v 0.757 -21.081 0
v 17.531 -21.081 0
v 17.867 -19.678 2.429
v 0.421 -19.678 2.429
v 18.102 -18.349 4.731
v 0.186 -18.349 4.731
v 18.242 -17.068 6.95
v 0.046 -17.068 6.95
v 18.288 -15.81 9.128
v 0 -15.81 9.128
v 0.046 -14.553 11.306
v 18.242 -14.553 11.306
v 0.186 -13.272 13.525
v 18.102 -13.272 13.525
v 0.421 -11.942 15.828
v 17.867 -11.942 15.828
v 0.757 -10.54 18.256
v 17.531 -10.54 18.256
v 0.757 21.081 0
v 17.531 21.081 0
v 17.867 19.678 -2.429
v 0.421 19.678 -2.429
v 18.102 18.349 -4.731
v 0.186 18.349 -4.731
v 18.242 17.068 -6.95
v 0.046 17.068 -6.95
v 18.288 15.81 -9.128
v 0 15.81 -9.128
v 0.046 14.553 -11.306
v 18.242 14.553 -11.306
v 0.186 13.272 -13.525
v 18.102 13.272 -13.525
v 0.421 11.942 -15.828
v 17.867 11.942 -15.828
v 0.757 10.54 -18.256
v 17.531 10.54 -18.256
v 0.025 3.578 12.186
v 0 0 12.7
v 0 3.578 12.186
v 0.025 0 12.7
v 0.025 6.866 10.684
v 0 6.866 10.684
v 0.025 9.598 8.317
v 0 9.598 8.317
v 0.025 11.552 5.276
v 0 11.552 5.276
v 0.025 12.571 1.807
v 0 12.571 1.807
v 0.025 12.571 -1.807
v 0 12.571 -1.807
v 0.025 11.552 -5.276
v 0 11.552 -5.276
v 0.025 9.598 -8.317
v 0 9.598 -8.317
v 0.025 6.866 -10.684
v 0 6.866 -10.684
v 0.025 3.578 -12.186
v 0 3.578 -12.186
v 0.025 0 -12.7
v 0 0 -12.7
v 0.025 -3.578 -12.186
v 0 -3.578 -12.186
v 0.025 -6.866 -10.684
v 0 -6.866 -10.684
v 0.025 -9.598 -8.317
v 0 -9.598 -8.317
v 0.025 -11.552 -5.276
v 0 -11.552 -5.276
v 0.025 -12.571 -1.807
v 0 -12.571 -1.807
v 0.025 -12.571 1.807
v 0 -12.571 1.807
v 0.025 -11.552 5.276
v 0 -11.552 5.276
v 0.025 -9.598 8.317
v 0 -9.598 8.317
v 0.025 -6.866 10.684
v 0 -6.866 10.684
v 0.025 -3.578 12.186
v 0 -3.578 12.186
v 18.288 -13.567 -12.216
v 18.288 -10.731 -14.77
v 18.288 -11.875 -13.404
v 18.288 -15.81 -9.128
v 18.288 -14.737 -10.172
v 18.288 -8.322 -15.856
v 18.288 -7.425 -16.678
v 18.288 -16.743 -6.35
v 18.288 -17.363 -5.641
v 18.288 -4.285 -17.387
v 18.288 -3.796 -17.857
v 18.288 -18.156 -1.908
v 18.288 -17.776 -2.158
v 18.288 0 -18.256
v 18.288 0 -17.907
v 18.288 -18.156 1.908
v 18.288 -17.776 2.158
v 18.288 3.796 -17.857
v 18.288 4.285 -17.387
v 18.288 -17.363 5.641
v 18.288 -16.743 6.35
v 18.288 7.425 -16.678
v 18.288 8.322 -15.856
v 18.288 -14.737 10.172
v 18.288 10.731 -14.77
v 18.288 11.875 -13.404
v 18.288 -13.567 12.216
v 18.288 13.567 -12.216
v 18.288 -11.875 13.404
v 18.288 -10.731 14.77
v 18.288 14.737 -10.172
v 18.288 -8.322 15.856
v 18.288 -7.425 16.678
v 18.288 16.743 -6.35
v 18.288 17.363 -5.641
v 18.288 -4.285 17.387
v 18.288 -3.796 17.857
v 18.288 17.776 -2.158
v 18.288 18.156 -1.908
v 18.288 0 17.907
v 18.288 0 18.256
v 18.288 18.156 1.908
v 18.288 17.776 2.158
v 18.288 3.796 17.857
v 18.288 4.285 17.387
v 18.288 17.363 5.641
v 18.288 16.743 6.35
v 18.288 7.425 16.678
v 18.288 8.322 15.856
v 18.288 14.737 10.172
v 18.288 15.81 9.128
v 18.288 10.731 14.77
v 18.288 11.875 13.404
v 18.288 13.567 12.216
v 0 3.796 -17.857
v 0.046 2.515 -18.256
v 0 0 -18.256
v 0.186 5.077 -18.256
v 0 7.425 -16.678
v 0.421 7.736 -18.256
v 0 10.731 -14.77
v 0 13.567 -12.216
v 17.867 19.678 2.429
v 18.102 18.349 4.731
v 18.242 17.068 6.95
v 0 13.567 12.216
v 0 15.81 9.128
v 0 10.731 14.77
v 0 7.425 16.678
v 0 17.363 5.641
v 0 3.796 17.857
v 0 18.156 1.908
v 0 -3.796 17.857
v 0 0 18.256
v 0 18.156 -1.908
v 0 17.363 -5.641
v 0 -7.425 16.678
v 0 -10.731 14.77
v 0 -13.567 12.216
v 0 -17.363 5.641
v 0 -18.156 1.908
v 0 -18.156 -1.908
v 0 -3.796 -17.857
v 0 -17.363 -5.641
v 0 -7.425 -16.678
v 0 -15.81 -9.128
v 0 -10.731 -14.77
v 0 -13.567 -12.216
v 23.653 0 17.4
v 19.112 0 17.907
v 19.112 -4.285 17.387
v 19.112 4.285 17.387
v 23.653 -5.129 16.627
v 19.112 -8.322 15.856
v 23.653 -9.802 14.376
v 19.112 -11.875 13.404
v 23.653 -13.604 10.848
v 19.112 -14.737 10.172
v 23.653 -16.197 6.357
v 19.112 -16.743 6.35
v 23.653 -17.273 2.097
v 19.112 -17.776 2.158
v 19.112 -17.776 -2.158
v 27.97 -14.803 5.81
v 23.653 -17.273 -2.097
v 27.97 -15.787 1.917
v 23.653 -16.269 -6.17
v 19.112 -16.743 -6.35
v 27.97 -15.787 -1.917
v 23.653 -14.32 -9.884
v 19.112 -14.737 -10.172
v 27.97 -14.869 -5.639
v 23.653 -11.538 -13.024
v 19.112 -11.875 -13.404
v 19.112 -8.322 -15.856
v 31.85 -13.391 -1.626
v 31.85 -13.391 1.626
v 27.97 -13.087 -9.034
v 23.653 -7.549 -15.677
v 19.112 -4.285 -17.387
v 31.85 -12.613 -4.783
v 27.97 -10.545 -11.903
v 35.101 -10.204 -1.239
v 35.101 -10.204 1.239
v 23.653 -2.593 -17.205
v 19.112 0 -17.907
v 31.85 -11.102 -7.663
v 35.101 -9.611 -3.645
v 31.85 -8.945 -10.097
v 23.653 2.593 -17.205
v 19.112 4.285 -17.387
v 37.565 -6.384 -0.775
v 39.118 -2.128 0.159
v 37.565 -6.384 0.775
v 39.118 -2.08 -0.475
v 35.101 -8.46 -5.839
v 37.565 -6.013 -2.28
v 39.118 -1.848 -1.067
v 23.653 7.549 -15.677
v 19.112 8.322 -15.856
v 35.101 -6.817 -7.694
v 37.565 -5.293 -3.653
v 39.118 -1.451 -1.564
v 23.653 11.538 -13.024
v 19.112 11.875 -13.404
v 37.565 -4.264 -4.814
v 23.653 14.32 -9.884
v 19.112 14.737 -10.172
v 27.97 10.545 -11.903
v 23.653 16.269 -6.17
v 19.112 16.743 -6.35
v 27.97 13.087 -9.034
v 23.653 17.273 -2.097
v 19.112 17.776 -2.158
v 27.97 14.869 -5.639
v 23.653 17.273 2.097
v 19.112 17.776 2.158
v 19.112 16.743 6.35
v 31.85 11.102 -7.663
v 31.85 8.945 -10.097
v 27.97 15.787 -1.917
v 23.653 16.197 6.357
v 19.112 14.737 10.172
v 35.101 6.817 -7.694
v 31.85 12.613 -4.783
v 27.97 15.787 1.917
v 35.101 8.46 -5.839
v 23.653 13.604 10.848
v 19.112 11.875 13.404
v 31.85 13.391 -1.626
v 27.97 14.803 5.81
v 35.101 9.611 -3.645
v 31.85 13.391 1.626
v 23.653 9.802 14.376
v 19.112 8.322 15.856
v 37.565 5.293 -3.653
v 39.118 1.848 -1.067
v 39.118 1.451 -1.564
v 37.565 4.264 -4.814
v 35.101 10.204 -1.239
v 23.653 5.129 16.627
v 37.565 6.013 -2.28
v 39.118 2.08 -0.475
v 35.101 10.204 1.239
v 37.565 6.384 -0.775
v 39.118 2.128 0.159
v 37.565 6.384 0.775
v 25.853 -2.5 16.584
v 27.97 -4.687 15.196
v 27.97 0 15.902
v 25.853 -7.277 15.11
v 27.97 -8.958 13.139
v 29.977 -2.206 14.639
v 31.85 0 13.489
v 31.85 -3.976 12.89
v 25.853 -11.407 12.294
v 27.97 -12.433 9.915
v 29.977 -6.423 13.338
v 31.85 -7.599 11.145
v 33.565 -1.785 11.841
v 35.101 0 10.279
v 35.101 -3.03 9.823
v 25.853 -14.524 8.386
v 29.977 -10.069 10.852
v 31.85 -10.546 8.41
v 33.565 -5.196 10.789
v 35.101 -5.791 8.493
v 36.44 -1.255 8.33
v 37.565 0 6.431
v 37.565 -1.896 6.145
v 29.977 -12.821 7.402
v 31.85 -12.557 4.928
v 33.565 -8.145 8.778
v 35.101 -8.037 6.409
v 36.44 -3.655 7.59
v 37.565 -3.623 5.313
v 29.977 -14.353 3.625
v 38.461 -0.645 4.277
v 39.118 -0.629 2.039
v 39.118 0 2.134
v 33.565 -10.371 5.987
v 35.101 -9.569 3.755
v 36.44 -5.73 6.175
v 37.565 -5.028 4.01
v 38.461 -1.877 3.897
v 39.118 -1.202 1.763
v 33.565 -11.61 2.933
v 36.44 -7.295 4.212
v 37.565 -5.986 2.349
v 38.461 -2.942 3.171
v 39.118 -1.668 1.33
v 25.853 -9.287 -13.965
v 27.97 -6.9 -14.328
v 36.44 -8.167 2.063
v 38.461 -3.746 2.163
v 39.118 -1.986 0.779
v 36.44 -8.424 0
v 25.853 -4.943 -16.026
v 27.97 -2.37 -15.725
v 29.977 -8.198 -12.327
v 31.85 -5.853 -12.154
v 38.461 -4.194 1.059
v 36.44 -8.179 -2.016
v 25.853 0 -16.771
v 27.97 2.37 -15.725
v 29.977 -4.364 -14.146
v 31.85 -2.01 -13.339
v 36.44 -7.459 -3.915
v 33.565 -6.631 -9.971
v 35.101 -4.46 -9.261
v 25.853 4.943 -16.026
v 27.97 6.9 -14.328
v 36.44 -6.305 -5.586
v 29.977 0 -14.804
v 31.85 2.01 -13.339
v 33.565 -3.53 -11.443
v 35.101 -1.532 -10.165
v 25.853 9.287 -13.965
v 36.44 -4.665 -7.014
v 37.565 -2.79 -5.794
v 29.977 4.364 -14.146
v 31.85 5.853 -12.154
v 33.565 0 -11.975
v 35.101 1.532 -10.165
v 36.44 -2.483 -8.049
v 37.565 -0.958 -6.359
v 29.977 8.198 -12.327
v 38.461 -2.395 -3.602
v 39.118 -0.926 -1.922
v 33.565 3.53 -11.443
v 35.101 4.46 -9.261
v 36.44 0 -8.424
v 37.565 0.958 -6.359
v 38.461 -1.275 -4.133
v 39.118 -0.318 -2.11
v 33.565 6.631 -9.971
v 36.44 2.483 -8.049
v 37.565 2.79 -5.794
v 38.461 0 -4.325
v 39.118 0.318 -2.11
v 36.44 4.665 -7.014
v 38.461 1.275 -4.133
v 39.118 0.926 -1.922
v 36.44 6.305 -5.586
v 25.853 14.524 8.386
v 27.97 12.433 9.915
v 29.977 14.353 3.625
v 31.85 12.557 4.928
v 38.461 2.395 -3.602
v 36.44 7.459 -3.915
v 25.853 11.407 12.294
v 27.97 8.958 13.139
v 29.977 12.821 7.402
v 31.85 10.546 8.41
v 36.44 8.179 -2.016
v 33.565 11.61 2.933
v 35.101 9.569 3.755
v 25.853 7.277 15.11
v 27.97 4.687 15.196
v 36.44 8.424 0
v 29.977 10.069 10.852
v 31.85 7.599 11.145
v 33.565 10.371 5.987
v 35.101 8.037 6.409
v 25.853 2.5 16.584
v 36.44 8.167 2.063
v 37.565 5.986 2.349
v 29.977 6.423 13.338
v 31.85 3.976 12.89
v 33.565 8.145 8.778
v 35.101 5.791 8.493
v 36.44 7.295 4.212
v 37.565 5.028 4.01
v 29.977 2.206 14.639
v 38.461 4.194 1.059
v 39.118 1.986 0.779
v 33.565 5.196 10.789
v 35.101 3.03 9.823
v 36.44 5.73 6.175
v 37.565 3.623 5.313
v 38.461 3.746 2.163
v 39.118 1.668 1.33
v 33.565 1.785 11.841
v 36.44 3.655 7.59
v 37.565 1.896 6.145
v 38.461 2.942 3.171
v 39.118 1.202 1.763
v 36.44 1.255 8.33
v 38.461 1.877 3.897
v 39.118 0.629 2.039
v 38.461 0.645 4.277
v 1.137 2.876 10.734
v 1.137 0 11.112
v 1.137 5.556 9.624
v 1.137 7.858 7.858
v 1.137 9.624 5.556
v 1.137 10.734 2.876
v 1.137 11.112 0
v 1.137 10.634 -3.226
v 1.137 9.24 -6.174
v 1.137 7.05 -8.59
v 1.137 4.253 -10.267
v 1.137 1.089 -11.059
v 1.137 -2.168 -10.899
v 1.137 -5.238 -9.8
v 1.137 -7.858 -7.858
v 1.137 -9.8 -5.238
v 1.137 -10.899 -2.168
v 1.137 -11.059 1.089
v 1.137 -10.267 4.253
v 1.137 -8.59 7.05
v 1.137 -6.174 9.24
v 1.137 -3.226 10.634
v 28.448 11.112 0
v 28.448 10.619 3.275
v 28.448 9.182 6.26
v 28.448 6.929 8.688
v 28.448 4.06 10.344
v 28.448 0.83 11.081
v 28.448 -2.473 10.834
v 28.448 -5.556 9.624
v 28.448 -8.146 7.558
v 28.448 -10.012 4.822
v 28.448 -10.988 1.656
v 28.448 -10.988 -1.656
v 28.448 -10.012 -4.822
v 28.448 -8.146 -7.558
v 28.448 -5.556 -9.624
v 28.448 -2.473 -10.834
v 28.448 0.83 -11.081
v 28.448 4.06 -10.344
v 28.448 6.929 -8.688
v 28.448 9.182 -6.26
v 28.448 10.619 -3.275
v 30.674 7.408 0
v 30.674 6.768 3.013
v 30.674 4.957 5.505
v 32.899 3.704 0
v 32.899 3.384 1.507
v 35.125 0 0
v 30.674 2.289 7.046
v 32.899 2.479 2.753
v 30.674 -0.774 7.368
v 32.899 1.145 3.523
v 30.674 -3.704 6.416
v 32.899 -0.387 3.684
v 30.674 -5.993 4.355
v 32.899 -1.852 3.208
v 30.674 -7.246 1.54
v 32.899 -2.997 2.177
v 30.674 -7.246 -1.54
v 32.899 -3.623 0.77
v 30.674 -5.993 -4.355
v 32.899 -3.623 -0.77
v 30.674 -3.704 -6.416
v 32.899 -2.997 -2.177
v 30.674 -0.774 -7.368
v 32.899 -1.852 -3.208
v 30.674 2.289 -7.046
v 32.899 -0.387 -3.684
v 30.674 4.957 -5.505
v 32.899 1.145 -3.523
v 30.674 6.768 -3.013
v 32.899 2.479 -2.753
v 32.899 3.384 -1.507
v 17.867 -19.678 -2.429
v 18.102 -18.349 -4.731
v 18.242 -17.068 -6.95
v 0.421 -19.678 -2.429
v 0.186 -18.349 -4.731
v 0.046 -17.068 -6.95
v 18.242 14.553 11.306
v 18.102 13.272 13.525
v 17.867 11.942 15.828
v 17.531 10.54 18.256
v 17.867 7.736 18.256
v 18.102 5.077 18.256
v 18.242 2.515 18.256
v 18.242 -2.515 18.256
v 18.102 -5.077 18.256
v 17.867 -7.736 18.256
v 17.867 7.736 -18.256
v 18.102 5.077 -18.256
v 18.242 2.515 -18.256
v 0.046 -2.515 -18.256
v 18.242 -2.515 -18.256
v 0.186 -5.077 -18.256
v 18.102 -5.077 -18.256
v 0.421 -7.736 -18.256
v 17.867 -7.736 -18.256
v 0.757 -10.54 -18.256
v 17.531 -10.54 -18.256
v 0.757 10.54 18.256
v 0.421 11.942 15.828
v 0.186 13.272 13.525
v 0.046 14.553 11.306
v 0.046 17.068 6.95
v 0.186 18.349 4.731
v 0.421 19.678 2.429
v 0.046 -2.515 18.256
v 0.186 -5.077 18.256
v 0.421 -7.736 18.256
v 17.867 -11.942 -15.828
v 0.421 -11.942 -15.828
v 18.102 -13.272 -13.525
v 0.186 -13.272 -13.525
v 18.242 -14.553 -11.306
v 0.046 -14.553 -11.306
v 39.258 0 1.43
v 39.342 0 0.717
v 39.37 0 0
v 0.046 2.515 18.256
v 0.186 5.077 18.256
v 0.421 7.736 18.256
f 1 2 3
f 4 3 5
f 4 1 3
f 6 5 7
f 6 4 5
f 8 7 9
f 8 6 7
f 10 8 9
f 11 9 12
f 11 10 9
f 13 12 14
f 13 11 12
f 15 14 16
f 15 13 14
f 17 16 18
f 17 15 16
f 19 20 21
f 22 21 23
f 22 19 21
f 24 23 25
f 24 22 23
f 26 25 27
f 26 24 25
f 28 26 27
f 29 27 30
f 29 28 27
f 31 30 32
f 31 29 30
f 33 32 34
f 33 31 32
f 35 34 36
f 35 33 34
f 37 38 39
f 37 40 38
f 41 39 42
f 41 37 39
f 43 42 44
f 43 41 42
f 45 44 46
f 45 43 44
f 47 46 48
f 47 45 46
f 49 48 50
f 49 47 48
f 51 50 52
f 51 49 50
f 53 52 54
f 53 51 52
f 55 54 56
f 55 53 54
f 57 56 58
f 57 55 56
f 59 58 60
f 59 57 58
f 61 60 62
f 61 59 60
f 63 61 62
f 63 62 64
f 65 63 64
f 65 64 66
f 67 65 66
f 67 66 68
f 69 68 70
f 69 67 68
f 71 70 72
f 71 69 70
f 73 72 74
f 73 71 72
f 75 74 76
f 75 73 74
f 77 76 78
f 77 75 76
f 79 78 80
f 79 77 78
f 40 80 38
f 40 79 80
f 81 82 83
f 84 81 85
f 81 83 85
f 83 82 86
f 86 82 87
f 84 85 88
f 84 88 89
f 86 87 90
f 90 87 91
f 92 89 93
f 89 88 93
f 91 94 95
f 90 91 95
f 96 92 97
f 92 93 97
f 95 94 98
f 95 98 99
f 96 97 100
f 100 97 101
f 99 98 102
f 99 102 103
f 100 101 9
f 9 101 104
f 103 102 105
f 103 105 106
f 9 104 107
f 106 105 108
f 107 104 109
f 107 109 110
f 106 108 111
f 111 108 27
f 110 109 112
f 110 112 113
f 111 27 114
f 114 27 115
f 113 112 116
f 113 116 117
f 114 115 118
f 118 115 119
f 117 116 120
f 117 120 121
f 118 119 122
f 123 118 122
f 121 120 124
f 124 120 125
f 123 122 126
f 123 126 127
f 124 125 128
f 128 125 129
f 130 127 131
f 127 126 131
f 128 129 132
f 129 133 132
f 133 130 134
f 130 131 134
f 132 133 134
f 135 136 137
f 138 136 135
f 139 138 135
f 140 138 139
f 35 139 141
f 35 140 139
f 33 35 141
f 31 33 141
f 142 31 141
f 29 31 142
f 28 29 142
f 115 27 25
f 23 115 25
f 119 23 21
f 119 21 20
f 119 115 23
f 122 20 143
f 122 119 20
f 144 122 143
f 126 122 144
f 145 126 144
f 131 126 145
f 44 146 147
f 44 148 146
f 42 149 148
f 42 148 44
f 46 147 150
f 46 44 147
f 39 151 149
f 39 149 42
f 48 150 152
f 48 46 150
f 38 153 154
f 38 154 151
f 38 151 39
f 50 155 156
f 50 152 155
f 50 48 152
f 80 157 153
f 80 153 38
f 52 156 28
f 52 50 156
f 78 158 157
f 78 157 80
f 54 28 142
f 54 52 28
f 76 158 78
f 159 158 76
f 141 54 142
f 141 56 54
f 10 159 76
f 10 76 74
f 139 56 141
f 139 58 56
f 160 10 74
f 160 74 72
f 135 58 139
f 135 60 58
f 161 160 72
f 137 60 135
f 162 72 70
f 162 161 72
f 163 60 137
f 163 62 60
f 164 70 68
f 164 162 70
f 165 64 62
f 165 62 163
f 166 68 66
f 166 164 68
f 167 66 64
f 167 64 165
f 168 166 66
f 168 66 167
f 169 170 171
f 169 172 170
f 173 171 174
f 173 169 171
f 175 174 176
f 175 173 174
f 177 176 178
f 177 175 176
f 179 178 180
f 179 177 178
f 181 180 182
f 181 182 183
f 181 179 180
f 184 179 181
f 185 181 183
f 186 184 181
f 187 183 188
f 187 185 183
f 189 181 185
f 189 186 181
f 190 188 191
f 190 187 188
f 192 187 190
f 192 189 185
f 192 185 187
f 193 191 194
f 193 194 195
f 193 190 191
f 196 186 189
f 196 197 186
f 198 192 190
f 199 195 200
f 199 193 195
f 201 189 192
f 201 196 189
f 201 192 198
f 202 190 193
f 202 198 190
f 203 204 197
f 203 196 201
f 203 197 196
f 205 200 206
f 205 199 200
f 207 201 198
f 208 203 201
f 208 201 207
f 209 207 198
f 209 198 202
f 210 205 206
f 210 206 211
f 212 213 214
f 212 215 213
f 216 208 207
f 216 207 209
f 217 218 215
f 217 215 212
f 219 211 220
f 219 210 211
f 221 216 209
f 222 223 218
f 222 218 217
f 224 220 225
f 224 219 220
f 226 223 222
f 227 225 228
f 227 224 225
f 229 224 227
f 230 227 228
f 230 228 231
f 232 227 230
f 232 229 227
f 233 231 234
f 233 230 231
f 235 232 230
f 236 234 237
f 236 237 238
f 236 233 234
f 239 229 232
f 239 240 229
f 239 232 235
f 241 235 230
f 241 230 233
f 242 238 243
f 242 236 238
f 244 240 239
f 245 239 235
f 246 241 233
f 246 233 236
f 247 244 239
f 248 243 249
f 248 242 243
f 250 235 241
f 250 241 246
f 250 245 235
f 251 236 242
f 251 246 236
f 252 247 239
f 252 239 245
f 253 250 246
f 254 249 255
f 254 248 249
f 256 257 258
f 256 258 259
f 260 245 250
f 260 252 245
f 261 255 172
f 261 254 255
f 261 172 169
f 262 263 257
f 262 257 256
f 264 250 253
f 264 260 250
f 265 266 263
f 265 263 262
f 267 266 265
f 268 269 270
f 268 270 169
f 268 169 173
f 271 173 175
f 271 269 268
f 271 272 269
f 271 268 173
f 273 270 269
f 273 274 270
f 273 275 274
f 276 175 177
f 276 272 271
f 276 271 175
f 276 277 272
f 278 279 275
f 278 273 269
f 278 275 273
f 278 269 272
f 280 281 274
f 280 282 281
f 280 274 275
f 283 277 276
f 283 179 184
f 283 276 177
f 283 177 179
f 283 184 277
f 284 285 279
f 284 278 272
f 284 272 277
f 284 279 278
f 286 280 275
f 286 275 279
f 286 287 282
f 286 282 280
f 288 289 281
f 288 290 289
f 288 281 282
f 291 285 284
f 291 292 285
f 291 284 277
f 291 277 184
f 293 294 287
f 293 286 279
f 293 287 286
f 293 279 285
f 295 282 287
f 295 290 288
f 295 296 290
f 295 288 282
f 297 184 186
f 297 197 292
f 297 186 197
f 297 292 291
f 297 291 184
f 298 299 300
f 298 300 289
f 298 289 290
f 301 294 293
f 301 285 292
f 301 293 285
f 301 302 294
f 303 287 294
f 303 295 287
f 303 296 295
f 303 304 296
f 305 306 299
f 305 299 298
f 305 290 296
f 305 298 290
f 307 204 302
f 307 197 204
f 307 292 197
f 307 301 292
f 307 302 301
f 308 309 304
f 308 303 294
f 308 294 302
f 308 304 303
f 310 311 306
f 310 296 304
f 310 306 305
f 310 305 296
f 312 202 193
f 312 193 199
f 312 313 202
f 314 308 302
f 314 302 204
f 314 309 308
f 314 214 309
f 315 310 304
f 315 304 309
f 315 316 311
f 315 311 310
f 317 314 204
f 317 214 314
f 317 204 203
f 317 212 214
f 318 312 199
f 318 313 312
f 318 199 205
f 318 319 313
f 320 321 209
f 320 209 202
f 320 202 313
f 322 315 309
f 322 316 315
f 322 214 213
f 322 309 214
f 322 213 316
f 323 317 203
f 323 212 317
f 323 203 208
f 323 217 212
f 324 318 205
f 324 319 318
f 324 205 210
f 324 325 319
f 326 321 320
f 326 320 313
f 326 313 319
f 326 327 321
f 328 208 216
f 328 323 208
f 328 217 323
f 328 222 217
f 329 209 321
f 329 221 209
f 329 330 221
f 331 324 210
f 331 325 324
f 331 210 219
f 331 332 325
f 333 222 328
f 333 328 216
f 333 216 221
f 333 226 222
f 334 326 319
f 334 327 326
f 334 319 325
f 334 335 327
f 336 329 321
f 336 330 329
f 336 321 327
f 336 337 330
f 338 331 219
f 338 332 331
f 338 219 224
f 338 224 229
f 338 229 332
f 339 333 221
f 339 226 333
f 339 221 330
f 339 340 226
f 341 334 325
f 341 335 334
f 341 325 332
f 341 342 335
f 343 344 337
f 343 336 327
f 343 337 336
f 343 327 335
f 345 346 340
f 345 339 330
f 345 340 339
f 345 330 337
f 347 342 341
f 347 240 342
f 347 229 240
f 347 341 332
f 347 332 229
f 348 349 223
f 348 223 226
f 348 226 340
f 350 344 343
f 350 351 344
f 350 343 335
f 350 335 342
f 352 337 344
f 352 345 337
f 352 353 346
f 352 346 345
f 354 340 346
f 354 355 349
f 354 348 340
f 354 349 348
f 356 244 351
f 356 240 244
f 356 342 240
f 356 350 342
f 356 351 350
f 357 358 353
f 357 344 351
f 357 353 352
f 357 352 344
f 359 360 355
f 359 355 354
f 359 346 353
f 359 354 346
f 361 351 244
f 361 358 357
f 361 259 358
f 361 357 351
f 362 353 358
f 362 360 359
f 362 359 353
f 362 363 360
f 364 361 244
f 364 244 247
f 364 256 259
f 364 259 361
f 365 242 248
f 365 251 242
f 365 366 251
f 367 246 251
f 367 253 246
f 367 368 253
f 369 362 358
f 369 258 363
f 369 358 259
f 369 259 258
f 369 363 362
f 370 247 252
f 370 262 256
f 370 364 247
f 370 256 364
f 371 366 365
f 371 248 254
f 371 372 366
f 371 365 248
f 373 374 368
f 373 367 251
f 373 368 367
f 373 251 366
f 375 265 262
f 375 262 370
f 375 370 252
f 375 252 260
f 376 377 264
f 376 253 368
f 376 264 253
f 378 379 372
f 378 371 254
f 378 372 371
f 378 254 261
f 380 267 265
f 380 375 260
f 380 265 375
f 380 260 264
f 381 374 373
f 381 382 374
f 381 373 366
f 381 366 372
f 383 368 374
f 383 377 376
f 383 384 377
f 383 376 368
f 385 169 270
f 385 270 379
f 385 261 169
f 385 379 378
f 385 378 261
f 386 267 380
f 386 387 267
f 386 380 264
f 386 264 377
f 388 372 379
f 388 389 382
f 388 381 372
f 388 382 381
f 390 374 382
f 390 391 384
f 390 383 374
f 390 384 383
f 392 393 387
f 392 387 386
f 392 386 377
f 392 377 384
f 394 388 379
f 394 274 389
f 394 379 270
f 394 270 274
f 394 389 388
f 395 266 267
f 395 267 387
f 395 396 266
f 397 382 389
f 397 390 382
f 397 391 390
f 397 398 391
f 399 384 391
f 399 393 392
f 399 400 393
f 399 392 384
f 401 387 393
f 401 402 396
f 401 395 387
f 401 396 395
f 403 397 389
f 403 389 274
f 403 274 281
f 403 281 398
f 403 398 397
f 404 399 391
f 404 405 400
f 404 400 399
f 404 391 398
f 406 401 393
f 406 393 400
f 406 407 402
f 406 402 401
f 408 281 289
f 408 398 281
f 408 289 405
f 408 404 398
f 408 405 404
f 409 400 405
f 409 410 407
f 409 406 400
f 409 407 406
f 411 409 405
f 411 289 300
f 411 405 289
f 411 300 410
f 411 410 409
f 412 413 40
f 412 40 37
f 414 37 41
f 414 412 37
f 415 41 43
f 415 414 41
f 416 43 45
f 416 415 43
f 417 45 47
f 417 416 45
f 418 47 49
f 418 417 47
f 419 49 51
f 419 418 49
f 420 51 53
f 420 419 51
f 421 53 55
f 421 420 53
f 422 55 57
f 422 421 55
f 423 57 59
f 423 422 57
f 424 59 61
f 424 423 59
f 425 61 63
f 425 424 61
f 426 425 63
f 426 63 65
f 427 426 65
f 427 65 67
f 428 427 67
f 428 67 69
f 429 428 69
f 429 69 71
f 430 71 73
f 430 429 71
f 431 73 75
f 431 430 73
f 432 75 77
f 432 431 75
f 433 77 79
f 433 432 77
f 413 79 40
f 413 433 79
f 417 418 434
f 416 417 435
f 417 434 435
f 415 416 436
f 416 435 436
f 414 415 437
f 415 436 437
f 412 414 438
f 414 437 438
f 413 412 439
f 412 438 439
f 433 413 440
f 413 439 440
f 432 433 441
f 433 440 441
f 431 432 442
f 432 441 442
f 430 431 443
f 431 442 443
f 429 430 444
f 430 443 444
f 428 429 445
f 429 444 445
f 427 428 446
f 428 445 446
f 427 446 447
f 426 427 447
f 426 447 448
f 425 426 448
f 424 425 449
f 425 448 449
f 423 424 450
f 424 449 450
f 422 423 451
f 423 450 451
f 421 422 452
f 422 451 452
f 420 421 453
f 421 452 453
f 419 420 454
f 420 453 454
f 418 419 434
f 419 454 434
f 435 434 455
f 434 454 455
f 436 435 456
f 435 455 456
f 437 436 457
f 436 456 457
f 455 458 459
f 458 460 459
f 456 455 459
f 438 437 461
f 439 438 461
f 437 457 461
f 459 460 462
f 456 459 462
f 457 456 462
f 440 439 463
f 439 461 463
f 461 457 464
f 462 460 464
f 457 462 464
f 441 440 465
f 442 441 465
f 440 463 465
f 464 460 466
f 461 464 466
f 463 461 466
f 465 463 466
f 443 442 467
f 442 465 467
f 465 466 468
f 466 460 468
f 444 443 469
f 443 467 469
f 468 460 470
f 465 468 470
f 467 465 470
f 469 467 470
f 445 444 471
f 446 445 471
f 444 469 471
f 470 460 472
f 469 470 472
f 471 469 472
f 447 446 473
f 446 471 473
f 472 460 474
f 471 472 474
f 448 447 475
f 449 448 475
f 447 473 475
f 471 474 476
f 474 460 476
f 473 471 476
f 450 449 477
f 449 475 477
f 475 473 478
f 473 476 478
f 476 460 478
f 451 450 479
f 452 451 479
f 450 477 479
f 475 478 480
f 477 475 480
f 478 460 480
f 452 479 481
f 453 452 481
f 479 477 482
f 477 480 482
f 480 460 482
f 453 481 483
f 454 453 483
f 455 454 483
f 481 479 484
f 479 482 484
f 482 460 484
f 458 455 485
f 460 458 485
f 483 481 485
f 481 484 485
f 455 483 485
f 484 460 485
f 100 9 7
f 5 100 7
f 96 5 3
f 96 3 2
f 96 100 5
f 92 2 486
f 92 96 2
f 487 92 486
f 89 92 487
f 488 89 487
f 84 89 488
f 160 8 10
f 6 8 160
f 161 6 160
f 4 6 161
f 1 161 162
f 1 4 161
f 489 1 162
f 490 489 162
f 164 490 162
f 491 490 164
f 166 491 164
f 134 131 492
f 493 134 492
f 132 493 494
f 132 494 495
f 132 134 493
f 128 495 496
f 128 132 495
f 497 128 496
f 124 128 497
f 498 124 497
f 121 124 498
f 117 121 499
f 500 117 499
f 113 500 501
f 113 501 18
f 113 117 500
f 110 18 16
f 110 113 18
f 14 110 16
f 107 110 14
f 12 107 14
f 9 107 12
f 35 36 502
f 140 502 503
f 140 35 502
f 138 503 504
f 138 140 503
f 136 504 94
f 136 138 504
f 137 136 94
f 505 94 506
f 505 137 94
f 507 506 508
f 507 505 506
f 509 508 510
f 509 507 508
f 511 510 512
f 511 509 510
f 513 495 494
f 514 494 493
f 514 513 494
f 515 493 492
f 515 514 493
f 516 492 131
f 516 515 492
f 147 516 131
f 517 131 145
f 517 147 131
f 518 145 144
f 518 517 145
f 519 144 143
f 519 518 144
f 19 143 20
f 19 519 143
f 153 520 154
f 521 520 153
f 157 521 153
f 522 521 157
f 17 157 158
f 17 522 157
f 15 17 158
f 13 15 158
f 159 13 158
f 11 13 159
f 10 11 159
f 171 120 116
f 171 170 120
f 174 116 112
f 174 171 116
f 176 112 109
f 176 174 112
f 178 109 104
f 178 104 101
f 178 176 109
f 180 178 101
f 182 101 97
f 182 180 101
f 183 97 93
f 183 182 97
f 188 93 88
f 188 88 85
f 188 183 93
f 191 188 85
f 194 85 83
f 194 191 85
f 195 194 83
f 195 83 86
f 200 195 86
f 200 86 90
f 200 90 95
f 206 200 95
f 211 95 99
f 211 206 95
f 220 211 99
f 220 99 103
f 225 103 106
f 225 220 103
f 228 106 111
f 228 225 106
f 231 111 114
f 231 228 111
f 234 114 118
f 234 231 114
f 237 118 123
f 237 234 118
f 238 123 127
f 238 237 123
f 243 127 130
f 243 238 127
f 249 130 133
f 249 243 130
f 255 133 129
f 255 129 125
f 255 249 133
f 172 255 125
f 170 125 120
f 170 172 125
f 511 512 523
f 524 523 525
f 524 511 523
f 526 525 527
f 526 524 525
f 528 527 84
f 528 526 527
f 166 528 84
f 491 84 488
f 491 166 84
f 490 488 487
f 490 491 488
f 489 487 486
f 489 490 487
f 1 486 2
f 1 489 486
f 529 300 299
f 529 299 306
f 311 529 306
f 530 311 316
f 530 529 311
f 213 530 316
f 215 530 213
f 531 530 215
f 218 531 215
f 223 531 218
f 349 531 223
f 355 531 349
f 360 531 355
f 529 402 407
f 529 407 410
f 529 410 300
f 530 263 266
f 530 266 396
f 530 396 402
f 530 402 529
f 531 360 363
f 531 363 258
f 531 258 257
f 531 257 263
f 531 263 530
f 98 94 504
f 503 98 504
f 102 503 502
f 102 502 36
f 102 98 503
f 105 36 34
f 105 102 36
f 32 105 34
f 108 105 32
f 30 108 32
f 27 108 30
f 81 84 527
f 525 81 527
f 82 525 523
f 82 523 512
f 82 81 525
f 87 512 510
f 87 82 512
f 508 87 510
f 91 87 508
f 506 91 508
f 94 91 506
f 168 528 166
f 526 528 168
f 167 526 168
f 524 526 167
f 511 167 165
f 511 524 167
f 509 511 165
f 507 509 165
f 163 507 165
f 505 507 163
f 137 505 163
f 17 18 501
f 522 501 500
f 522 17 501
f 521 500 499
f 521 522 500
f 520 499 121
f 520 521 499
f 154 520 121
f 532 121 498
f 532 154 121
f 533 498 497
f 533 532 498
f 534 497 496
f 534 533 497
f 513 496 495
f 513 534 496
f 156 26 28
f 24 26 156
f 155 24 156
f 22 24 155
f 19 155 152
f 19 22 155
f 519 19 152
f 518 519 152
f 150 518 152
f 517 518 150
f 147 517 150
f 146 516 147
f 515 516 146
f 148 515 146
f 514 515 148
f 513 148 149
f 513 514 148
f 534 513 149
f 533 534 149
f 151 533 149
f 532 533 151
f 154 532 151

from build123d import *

# Parameters (mm, degrees)
BASENUT_DEPTH = 18.288


# Read off the part's stored shape, not the designer's step: ThreadSchematic
with BuildPart() as part:
    # BaseNutSke → BaseNut (new body)
    with BuildSketch(Plane(origin=(0, 0, 0), x_dir=(0, 0, -1), z_dir=(1, 0, 0))):
        Polygon((18.25625, 10.540250852), (18.25625, -10.540250852), (0, -21.080501704), (-18.25625, -10.540250852), (-18.25625, 10.540250852), (0, 21.080501704), align=None)
    extrude(amount=BASENUT_DEPTH)

    # Sketch3 → Crown (revolve)
    with BuildSketch(Plane.XY, mode=Mode.PRIVATE) as crown_sk:
        with BuildLine():
            Line((39.37, 0), (0, 0))
            Line((0, 0), (0, 17.907))
            Line((0, 17.907), (19.111504465, 17.907))
            ThreePointArc((19.111504465, 17.907), (31.849674106, 13.489376766), (39.117596428, 2.1336))
            ThreePointArc((39.117596428, 2.1336), (39.306679868, 1.074238861), (39.37, 0))
        make_face()
    revolve(crown_sk.sketch.rotate(Axis((0, 0, 0), (1, 0, 0)), 90), axis=Axis((0, 0, 0), (1, 0, 0)))

    # Sketch4 → DoubleChamfer (revolve, cut)
    with BuildSketch(Plane.XY, mode=Mode.PRIVATE) as doublechamfer_sk:
        Polygon((0, 18.25625), (1.955420677, 25.553979317), (16.332934387, 25.553979317), (18.288, 18.25625), (30.988, 18.25625), (30.988, 43.65625), (-12.7, 43.65625), (-12.7, 18.25625), align=None)
    revolve(doublechamfer_sk.sketch.rotate(Axis((0, 0, 0), (1, 0, 0)), 90), axis=Axis((0, 0, 0), (1, 0, 0)), mode=Mode.SUBTRACT)

    # ThreadSchematic outline → ThreadSchematic (revolve, cut)
    with BuildSketch(Plane.YX):
        Polygon((11.1125, 0), (11.1125, 28.448), (0, 35.125063629), (0, 0), align=None)
    revolve(axis=Axis((0, 0, 0), (1, 0, 0)), mode=Mode.SUBTRACT)

    # EndChamferSketch → EndChamfer (revolve, cut)
    with BuildSketch(Plane.XY, mode=Mode.PRIVATE) as endchamfer_sk:
        Polygon((-0.0254, 12.7), (0.0254, 12.7), (1.248137414, 10.95375), (-0.0254, 10.95375), align=None)
    revolve(endchamfer_sk.sketch.rotate(Axis((0, 0, 0), (-1, 0, 0)), 270), axis=Axis((0, 0, 0), (-1, 0, 0)), mode=Mode.SUBTRACT)


solid = part.part
